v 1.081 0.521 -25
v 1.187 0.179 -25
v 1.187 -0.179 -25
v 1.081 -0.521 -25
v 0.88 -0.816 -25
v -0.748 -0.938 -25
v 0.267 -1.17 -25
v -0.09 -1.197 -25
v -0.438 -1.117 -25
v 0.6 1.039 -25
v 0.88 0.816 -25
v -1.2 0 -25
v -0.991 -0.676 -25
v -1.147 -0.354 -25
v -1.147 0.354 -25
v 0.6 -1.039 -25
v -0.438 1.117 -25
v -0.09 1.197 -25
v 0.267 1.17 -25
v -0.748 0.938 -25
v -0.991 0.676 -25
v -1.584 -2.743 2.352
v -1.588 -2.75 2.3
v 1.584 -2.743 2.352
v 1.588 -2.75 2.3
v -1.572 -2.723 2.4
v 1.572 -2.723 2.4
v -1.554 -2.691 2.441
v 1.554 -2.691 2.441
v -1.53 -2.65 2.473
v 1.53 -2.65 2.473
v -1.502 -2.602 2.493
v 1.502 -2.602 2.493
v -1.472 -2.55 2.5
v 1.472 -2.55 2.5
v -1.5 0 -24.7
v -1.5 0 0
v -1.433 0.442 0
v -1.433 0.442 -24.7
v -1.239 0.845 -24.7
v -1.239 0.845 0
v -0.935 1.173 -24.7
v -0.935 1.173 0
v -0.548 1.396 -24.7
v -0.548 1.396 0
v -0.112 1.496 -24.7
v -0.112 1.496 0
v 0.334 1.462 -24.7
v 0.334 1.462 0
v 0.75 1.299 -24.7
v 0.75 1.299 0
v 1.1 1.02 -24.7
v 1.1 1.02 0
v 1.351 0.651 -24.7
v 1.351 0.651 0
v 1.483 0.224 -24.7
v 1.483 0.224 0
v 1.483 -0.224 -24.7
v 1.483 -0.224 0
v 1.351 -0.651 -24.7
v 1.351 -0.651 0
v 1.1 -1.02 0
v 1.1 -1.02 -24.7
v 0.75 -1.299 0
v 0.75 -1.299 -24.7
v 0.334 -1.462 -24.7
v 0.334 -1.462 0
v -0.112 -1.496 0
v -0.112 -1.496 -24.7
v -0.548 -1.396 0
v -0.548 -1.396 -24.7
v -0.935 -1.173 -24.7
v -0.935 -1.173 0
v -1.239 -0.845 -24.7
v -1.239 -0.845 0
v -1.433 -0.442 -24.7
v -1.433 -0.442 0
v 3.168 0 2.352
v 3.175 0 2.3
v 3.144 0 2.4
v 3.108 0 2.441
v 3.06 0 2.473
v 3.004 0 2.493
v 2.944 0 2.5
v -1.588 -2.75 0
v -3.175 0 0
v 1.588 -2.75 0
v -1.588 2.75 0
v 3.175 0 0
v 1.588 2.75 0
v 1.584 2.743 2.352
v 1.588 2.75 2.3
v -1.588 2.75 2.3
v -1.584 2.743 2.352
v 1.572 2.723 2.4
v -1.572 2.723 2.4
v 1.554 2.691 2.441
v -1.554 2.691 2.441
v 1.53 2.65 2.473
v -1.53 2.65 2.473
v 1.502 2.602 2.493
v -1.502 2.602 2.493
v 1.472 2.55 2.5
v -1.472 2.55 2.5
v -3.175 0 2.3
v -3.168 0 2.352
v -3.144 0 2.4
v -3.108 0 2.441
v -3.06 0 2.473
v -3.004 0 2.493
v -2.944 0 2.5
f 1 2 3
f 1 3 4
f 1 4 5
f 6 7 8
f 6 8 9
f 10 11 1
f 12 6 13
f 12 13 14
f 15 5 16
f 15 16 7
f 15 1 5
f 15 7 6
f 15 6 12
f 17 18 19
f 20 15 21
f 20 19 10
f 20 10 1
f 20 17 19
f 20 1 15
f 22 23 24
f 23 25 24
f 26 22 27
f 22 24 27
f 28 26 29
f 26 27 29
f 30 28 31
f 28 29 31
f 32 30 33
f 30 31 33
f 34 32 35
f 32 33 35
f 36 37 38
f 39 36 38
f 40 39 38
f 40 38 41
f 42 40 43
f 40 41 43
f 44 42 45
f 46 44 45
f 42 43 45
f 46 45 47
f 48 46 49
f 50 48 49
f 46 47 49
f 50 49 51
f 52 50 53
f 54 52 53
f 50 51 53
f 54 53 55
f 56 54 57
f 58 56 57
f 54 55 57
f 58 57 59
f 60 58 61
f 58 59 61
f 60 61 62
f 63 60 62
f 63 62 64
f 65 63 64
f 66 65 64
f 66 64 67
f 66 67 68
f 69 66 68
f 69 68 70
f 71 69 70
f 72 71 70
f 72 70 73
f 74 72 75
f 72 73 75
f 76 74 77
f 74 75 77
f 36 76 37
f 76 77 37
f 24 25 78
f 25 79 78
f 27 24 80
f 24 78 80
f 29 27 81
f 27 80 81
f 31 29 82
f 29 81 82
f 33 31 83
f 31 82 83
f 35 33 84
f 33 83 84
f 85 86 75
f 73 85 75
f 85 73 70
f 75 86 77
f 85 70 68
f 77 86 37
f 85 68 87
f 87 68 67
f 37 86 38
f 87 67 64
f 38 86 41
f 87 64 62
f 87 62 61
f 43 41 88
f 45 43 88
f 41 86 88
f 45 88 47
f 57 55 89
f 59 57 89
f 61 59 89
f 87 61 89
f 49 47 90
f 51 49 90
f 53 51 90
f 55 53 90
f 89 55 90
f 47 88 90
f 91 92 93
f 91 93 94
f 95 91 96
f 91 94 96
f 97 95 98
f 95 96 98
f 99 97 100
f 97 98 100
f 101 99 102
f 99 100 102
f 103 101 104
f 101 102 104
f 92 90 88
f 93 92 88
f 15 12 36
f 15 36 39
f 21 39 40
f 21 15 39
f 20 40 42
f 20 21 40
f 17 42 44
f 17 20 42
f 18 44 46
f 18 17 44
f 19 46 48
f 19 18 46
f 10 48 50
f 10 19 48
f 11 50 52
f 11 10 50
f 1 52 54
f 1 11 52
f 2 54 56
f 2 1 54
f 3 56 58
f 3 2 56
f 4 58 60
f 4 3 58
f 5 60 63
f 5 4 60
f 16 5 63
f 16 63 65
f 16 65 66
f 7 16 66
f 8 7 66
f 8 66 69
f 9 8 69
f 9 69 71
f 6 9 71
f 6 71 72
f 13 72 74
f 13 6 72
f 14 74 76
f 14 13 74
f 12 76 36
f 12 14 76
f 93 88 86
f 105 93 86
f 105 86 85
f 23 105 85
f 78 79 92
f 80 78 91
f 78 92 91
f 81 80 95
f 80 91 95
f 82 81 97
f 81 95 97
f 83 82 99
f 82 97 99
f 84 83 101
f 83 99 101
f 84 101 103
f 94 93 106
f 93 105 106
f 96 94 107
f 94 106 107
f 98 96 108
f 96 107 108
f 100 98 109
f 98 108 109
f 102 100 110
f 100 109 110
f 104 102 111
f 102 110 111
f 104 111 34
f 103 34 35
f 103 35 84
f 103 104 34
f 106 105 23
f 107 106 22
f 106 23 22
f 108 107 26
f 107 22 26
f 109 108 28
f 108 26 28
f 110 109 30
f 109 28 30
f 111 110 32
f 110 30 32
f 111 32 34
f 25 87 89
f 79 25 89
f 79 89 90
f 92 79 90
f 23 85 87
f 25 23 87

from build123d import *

# Parameters (mm, degrees)
BOSS_EXTRUDE1_DEPTH = 2.5
SKETCH2_R           = 1.5
BOSS_EXTRUDE2_DEPTH = 25
CHAMFER1_SIZE       = 0.3
FILLET1_R           = 0.2


with BuildPart() as part:
    # Sketch1 → Boss-Extrude1 (new body)
    with BuildSketch(Plane.XY):
        Polygon((3.175426481, 0), (1.58771324, 2.75), (-1.58771324, 2.75), (-3.175426481, 0), (-1.58771324, -2.75), (1.58771324, -2.75), align=None)
    extrude(amount=BOSS_EXTRUDE1_DEPTH)

    # Sketch2 → Boss-Extrude2 (add)
    with BuildSketch(Plane(origin=(0, 0, 0), x_dir=(-1, 0, 0), z_dir=(0, 0, -1))):
        Circle(SKETCH2_R)
    extrude(amount=BOSS_EXTRUDE2_DEPTH)

    # Chamfer1
    chamfer1_edges = [part.edges().sort_by_distance(p)[0] for p in [
        (1.5, 0, -25),
    ]]
    chamfer(chamfer1_edges, length=CHAMFER1_SIZE)

    # Fillet1
    fillet1_edges = [part.edges().sort_by_distance(p)[0] for p in [
        (0, 2.75, 2.5),
        (-2.38156986, 1.375, 2.5),
        (-2.38156986, -1.375, 2.5),
        (0, -2.75, 2.5),
        (2.38156986, -1.375, 2.5),
        (2.38156986, 1.375, 2.5),
    ]]
    fillet(fillet1_edges, radius=FILLET1_R)


solid = part.part
